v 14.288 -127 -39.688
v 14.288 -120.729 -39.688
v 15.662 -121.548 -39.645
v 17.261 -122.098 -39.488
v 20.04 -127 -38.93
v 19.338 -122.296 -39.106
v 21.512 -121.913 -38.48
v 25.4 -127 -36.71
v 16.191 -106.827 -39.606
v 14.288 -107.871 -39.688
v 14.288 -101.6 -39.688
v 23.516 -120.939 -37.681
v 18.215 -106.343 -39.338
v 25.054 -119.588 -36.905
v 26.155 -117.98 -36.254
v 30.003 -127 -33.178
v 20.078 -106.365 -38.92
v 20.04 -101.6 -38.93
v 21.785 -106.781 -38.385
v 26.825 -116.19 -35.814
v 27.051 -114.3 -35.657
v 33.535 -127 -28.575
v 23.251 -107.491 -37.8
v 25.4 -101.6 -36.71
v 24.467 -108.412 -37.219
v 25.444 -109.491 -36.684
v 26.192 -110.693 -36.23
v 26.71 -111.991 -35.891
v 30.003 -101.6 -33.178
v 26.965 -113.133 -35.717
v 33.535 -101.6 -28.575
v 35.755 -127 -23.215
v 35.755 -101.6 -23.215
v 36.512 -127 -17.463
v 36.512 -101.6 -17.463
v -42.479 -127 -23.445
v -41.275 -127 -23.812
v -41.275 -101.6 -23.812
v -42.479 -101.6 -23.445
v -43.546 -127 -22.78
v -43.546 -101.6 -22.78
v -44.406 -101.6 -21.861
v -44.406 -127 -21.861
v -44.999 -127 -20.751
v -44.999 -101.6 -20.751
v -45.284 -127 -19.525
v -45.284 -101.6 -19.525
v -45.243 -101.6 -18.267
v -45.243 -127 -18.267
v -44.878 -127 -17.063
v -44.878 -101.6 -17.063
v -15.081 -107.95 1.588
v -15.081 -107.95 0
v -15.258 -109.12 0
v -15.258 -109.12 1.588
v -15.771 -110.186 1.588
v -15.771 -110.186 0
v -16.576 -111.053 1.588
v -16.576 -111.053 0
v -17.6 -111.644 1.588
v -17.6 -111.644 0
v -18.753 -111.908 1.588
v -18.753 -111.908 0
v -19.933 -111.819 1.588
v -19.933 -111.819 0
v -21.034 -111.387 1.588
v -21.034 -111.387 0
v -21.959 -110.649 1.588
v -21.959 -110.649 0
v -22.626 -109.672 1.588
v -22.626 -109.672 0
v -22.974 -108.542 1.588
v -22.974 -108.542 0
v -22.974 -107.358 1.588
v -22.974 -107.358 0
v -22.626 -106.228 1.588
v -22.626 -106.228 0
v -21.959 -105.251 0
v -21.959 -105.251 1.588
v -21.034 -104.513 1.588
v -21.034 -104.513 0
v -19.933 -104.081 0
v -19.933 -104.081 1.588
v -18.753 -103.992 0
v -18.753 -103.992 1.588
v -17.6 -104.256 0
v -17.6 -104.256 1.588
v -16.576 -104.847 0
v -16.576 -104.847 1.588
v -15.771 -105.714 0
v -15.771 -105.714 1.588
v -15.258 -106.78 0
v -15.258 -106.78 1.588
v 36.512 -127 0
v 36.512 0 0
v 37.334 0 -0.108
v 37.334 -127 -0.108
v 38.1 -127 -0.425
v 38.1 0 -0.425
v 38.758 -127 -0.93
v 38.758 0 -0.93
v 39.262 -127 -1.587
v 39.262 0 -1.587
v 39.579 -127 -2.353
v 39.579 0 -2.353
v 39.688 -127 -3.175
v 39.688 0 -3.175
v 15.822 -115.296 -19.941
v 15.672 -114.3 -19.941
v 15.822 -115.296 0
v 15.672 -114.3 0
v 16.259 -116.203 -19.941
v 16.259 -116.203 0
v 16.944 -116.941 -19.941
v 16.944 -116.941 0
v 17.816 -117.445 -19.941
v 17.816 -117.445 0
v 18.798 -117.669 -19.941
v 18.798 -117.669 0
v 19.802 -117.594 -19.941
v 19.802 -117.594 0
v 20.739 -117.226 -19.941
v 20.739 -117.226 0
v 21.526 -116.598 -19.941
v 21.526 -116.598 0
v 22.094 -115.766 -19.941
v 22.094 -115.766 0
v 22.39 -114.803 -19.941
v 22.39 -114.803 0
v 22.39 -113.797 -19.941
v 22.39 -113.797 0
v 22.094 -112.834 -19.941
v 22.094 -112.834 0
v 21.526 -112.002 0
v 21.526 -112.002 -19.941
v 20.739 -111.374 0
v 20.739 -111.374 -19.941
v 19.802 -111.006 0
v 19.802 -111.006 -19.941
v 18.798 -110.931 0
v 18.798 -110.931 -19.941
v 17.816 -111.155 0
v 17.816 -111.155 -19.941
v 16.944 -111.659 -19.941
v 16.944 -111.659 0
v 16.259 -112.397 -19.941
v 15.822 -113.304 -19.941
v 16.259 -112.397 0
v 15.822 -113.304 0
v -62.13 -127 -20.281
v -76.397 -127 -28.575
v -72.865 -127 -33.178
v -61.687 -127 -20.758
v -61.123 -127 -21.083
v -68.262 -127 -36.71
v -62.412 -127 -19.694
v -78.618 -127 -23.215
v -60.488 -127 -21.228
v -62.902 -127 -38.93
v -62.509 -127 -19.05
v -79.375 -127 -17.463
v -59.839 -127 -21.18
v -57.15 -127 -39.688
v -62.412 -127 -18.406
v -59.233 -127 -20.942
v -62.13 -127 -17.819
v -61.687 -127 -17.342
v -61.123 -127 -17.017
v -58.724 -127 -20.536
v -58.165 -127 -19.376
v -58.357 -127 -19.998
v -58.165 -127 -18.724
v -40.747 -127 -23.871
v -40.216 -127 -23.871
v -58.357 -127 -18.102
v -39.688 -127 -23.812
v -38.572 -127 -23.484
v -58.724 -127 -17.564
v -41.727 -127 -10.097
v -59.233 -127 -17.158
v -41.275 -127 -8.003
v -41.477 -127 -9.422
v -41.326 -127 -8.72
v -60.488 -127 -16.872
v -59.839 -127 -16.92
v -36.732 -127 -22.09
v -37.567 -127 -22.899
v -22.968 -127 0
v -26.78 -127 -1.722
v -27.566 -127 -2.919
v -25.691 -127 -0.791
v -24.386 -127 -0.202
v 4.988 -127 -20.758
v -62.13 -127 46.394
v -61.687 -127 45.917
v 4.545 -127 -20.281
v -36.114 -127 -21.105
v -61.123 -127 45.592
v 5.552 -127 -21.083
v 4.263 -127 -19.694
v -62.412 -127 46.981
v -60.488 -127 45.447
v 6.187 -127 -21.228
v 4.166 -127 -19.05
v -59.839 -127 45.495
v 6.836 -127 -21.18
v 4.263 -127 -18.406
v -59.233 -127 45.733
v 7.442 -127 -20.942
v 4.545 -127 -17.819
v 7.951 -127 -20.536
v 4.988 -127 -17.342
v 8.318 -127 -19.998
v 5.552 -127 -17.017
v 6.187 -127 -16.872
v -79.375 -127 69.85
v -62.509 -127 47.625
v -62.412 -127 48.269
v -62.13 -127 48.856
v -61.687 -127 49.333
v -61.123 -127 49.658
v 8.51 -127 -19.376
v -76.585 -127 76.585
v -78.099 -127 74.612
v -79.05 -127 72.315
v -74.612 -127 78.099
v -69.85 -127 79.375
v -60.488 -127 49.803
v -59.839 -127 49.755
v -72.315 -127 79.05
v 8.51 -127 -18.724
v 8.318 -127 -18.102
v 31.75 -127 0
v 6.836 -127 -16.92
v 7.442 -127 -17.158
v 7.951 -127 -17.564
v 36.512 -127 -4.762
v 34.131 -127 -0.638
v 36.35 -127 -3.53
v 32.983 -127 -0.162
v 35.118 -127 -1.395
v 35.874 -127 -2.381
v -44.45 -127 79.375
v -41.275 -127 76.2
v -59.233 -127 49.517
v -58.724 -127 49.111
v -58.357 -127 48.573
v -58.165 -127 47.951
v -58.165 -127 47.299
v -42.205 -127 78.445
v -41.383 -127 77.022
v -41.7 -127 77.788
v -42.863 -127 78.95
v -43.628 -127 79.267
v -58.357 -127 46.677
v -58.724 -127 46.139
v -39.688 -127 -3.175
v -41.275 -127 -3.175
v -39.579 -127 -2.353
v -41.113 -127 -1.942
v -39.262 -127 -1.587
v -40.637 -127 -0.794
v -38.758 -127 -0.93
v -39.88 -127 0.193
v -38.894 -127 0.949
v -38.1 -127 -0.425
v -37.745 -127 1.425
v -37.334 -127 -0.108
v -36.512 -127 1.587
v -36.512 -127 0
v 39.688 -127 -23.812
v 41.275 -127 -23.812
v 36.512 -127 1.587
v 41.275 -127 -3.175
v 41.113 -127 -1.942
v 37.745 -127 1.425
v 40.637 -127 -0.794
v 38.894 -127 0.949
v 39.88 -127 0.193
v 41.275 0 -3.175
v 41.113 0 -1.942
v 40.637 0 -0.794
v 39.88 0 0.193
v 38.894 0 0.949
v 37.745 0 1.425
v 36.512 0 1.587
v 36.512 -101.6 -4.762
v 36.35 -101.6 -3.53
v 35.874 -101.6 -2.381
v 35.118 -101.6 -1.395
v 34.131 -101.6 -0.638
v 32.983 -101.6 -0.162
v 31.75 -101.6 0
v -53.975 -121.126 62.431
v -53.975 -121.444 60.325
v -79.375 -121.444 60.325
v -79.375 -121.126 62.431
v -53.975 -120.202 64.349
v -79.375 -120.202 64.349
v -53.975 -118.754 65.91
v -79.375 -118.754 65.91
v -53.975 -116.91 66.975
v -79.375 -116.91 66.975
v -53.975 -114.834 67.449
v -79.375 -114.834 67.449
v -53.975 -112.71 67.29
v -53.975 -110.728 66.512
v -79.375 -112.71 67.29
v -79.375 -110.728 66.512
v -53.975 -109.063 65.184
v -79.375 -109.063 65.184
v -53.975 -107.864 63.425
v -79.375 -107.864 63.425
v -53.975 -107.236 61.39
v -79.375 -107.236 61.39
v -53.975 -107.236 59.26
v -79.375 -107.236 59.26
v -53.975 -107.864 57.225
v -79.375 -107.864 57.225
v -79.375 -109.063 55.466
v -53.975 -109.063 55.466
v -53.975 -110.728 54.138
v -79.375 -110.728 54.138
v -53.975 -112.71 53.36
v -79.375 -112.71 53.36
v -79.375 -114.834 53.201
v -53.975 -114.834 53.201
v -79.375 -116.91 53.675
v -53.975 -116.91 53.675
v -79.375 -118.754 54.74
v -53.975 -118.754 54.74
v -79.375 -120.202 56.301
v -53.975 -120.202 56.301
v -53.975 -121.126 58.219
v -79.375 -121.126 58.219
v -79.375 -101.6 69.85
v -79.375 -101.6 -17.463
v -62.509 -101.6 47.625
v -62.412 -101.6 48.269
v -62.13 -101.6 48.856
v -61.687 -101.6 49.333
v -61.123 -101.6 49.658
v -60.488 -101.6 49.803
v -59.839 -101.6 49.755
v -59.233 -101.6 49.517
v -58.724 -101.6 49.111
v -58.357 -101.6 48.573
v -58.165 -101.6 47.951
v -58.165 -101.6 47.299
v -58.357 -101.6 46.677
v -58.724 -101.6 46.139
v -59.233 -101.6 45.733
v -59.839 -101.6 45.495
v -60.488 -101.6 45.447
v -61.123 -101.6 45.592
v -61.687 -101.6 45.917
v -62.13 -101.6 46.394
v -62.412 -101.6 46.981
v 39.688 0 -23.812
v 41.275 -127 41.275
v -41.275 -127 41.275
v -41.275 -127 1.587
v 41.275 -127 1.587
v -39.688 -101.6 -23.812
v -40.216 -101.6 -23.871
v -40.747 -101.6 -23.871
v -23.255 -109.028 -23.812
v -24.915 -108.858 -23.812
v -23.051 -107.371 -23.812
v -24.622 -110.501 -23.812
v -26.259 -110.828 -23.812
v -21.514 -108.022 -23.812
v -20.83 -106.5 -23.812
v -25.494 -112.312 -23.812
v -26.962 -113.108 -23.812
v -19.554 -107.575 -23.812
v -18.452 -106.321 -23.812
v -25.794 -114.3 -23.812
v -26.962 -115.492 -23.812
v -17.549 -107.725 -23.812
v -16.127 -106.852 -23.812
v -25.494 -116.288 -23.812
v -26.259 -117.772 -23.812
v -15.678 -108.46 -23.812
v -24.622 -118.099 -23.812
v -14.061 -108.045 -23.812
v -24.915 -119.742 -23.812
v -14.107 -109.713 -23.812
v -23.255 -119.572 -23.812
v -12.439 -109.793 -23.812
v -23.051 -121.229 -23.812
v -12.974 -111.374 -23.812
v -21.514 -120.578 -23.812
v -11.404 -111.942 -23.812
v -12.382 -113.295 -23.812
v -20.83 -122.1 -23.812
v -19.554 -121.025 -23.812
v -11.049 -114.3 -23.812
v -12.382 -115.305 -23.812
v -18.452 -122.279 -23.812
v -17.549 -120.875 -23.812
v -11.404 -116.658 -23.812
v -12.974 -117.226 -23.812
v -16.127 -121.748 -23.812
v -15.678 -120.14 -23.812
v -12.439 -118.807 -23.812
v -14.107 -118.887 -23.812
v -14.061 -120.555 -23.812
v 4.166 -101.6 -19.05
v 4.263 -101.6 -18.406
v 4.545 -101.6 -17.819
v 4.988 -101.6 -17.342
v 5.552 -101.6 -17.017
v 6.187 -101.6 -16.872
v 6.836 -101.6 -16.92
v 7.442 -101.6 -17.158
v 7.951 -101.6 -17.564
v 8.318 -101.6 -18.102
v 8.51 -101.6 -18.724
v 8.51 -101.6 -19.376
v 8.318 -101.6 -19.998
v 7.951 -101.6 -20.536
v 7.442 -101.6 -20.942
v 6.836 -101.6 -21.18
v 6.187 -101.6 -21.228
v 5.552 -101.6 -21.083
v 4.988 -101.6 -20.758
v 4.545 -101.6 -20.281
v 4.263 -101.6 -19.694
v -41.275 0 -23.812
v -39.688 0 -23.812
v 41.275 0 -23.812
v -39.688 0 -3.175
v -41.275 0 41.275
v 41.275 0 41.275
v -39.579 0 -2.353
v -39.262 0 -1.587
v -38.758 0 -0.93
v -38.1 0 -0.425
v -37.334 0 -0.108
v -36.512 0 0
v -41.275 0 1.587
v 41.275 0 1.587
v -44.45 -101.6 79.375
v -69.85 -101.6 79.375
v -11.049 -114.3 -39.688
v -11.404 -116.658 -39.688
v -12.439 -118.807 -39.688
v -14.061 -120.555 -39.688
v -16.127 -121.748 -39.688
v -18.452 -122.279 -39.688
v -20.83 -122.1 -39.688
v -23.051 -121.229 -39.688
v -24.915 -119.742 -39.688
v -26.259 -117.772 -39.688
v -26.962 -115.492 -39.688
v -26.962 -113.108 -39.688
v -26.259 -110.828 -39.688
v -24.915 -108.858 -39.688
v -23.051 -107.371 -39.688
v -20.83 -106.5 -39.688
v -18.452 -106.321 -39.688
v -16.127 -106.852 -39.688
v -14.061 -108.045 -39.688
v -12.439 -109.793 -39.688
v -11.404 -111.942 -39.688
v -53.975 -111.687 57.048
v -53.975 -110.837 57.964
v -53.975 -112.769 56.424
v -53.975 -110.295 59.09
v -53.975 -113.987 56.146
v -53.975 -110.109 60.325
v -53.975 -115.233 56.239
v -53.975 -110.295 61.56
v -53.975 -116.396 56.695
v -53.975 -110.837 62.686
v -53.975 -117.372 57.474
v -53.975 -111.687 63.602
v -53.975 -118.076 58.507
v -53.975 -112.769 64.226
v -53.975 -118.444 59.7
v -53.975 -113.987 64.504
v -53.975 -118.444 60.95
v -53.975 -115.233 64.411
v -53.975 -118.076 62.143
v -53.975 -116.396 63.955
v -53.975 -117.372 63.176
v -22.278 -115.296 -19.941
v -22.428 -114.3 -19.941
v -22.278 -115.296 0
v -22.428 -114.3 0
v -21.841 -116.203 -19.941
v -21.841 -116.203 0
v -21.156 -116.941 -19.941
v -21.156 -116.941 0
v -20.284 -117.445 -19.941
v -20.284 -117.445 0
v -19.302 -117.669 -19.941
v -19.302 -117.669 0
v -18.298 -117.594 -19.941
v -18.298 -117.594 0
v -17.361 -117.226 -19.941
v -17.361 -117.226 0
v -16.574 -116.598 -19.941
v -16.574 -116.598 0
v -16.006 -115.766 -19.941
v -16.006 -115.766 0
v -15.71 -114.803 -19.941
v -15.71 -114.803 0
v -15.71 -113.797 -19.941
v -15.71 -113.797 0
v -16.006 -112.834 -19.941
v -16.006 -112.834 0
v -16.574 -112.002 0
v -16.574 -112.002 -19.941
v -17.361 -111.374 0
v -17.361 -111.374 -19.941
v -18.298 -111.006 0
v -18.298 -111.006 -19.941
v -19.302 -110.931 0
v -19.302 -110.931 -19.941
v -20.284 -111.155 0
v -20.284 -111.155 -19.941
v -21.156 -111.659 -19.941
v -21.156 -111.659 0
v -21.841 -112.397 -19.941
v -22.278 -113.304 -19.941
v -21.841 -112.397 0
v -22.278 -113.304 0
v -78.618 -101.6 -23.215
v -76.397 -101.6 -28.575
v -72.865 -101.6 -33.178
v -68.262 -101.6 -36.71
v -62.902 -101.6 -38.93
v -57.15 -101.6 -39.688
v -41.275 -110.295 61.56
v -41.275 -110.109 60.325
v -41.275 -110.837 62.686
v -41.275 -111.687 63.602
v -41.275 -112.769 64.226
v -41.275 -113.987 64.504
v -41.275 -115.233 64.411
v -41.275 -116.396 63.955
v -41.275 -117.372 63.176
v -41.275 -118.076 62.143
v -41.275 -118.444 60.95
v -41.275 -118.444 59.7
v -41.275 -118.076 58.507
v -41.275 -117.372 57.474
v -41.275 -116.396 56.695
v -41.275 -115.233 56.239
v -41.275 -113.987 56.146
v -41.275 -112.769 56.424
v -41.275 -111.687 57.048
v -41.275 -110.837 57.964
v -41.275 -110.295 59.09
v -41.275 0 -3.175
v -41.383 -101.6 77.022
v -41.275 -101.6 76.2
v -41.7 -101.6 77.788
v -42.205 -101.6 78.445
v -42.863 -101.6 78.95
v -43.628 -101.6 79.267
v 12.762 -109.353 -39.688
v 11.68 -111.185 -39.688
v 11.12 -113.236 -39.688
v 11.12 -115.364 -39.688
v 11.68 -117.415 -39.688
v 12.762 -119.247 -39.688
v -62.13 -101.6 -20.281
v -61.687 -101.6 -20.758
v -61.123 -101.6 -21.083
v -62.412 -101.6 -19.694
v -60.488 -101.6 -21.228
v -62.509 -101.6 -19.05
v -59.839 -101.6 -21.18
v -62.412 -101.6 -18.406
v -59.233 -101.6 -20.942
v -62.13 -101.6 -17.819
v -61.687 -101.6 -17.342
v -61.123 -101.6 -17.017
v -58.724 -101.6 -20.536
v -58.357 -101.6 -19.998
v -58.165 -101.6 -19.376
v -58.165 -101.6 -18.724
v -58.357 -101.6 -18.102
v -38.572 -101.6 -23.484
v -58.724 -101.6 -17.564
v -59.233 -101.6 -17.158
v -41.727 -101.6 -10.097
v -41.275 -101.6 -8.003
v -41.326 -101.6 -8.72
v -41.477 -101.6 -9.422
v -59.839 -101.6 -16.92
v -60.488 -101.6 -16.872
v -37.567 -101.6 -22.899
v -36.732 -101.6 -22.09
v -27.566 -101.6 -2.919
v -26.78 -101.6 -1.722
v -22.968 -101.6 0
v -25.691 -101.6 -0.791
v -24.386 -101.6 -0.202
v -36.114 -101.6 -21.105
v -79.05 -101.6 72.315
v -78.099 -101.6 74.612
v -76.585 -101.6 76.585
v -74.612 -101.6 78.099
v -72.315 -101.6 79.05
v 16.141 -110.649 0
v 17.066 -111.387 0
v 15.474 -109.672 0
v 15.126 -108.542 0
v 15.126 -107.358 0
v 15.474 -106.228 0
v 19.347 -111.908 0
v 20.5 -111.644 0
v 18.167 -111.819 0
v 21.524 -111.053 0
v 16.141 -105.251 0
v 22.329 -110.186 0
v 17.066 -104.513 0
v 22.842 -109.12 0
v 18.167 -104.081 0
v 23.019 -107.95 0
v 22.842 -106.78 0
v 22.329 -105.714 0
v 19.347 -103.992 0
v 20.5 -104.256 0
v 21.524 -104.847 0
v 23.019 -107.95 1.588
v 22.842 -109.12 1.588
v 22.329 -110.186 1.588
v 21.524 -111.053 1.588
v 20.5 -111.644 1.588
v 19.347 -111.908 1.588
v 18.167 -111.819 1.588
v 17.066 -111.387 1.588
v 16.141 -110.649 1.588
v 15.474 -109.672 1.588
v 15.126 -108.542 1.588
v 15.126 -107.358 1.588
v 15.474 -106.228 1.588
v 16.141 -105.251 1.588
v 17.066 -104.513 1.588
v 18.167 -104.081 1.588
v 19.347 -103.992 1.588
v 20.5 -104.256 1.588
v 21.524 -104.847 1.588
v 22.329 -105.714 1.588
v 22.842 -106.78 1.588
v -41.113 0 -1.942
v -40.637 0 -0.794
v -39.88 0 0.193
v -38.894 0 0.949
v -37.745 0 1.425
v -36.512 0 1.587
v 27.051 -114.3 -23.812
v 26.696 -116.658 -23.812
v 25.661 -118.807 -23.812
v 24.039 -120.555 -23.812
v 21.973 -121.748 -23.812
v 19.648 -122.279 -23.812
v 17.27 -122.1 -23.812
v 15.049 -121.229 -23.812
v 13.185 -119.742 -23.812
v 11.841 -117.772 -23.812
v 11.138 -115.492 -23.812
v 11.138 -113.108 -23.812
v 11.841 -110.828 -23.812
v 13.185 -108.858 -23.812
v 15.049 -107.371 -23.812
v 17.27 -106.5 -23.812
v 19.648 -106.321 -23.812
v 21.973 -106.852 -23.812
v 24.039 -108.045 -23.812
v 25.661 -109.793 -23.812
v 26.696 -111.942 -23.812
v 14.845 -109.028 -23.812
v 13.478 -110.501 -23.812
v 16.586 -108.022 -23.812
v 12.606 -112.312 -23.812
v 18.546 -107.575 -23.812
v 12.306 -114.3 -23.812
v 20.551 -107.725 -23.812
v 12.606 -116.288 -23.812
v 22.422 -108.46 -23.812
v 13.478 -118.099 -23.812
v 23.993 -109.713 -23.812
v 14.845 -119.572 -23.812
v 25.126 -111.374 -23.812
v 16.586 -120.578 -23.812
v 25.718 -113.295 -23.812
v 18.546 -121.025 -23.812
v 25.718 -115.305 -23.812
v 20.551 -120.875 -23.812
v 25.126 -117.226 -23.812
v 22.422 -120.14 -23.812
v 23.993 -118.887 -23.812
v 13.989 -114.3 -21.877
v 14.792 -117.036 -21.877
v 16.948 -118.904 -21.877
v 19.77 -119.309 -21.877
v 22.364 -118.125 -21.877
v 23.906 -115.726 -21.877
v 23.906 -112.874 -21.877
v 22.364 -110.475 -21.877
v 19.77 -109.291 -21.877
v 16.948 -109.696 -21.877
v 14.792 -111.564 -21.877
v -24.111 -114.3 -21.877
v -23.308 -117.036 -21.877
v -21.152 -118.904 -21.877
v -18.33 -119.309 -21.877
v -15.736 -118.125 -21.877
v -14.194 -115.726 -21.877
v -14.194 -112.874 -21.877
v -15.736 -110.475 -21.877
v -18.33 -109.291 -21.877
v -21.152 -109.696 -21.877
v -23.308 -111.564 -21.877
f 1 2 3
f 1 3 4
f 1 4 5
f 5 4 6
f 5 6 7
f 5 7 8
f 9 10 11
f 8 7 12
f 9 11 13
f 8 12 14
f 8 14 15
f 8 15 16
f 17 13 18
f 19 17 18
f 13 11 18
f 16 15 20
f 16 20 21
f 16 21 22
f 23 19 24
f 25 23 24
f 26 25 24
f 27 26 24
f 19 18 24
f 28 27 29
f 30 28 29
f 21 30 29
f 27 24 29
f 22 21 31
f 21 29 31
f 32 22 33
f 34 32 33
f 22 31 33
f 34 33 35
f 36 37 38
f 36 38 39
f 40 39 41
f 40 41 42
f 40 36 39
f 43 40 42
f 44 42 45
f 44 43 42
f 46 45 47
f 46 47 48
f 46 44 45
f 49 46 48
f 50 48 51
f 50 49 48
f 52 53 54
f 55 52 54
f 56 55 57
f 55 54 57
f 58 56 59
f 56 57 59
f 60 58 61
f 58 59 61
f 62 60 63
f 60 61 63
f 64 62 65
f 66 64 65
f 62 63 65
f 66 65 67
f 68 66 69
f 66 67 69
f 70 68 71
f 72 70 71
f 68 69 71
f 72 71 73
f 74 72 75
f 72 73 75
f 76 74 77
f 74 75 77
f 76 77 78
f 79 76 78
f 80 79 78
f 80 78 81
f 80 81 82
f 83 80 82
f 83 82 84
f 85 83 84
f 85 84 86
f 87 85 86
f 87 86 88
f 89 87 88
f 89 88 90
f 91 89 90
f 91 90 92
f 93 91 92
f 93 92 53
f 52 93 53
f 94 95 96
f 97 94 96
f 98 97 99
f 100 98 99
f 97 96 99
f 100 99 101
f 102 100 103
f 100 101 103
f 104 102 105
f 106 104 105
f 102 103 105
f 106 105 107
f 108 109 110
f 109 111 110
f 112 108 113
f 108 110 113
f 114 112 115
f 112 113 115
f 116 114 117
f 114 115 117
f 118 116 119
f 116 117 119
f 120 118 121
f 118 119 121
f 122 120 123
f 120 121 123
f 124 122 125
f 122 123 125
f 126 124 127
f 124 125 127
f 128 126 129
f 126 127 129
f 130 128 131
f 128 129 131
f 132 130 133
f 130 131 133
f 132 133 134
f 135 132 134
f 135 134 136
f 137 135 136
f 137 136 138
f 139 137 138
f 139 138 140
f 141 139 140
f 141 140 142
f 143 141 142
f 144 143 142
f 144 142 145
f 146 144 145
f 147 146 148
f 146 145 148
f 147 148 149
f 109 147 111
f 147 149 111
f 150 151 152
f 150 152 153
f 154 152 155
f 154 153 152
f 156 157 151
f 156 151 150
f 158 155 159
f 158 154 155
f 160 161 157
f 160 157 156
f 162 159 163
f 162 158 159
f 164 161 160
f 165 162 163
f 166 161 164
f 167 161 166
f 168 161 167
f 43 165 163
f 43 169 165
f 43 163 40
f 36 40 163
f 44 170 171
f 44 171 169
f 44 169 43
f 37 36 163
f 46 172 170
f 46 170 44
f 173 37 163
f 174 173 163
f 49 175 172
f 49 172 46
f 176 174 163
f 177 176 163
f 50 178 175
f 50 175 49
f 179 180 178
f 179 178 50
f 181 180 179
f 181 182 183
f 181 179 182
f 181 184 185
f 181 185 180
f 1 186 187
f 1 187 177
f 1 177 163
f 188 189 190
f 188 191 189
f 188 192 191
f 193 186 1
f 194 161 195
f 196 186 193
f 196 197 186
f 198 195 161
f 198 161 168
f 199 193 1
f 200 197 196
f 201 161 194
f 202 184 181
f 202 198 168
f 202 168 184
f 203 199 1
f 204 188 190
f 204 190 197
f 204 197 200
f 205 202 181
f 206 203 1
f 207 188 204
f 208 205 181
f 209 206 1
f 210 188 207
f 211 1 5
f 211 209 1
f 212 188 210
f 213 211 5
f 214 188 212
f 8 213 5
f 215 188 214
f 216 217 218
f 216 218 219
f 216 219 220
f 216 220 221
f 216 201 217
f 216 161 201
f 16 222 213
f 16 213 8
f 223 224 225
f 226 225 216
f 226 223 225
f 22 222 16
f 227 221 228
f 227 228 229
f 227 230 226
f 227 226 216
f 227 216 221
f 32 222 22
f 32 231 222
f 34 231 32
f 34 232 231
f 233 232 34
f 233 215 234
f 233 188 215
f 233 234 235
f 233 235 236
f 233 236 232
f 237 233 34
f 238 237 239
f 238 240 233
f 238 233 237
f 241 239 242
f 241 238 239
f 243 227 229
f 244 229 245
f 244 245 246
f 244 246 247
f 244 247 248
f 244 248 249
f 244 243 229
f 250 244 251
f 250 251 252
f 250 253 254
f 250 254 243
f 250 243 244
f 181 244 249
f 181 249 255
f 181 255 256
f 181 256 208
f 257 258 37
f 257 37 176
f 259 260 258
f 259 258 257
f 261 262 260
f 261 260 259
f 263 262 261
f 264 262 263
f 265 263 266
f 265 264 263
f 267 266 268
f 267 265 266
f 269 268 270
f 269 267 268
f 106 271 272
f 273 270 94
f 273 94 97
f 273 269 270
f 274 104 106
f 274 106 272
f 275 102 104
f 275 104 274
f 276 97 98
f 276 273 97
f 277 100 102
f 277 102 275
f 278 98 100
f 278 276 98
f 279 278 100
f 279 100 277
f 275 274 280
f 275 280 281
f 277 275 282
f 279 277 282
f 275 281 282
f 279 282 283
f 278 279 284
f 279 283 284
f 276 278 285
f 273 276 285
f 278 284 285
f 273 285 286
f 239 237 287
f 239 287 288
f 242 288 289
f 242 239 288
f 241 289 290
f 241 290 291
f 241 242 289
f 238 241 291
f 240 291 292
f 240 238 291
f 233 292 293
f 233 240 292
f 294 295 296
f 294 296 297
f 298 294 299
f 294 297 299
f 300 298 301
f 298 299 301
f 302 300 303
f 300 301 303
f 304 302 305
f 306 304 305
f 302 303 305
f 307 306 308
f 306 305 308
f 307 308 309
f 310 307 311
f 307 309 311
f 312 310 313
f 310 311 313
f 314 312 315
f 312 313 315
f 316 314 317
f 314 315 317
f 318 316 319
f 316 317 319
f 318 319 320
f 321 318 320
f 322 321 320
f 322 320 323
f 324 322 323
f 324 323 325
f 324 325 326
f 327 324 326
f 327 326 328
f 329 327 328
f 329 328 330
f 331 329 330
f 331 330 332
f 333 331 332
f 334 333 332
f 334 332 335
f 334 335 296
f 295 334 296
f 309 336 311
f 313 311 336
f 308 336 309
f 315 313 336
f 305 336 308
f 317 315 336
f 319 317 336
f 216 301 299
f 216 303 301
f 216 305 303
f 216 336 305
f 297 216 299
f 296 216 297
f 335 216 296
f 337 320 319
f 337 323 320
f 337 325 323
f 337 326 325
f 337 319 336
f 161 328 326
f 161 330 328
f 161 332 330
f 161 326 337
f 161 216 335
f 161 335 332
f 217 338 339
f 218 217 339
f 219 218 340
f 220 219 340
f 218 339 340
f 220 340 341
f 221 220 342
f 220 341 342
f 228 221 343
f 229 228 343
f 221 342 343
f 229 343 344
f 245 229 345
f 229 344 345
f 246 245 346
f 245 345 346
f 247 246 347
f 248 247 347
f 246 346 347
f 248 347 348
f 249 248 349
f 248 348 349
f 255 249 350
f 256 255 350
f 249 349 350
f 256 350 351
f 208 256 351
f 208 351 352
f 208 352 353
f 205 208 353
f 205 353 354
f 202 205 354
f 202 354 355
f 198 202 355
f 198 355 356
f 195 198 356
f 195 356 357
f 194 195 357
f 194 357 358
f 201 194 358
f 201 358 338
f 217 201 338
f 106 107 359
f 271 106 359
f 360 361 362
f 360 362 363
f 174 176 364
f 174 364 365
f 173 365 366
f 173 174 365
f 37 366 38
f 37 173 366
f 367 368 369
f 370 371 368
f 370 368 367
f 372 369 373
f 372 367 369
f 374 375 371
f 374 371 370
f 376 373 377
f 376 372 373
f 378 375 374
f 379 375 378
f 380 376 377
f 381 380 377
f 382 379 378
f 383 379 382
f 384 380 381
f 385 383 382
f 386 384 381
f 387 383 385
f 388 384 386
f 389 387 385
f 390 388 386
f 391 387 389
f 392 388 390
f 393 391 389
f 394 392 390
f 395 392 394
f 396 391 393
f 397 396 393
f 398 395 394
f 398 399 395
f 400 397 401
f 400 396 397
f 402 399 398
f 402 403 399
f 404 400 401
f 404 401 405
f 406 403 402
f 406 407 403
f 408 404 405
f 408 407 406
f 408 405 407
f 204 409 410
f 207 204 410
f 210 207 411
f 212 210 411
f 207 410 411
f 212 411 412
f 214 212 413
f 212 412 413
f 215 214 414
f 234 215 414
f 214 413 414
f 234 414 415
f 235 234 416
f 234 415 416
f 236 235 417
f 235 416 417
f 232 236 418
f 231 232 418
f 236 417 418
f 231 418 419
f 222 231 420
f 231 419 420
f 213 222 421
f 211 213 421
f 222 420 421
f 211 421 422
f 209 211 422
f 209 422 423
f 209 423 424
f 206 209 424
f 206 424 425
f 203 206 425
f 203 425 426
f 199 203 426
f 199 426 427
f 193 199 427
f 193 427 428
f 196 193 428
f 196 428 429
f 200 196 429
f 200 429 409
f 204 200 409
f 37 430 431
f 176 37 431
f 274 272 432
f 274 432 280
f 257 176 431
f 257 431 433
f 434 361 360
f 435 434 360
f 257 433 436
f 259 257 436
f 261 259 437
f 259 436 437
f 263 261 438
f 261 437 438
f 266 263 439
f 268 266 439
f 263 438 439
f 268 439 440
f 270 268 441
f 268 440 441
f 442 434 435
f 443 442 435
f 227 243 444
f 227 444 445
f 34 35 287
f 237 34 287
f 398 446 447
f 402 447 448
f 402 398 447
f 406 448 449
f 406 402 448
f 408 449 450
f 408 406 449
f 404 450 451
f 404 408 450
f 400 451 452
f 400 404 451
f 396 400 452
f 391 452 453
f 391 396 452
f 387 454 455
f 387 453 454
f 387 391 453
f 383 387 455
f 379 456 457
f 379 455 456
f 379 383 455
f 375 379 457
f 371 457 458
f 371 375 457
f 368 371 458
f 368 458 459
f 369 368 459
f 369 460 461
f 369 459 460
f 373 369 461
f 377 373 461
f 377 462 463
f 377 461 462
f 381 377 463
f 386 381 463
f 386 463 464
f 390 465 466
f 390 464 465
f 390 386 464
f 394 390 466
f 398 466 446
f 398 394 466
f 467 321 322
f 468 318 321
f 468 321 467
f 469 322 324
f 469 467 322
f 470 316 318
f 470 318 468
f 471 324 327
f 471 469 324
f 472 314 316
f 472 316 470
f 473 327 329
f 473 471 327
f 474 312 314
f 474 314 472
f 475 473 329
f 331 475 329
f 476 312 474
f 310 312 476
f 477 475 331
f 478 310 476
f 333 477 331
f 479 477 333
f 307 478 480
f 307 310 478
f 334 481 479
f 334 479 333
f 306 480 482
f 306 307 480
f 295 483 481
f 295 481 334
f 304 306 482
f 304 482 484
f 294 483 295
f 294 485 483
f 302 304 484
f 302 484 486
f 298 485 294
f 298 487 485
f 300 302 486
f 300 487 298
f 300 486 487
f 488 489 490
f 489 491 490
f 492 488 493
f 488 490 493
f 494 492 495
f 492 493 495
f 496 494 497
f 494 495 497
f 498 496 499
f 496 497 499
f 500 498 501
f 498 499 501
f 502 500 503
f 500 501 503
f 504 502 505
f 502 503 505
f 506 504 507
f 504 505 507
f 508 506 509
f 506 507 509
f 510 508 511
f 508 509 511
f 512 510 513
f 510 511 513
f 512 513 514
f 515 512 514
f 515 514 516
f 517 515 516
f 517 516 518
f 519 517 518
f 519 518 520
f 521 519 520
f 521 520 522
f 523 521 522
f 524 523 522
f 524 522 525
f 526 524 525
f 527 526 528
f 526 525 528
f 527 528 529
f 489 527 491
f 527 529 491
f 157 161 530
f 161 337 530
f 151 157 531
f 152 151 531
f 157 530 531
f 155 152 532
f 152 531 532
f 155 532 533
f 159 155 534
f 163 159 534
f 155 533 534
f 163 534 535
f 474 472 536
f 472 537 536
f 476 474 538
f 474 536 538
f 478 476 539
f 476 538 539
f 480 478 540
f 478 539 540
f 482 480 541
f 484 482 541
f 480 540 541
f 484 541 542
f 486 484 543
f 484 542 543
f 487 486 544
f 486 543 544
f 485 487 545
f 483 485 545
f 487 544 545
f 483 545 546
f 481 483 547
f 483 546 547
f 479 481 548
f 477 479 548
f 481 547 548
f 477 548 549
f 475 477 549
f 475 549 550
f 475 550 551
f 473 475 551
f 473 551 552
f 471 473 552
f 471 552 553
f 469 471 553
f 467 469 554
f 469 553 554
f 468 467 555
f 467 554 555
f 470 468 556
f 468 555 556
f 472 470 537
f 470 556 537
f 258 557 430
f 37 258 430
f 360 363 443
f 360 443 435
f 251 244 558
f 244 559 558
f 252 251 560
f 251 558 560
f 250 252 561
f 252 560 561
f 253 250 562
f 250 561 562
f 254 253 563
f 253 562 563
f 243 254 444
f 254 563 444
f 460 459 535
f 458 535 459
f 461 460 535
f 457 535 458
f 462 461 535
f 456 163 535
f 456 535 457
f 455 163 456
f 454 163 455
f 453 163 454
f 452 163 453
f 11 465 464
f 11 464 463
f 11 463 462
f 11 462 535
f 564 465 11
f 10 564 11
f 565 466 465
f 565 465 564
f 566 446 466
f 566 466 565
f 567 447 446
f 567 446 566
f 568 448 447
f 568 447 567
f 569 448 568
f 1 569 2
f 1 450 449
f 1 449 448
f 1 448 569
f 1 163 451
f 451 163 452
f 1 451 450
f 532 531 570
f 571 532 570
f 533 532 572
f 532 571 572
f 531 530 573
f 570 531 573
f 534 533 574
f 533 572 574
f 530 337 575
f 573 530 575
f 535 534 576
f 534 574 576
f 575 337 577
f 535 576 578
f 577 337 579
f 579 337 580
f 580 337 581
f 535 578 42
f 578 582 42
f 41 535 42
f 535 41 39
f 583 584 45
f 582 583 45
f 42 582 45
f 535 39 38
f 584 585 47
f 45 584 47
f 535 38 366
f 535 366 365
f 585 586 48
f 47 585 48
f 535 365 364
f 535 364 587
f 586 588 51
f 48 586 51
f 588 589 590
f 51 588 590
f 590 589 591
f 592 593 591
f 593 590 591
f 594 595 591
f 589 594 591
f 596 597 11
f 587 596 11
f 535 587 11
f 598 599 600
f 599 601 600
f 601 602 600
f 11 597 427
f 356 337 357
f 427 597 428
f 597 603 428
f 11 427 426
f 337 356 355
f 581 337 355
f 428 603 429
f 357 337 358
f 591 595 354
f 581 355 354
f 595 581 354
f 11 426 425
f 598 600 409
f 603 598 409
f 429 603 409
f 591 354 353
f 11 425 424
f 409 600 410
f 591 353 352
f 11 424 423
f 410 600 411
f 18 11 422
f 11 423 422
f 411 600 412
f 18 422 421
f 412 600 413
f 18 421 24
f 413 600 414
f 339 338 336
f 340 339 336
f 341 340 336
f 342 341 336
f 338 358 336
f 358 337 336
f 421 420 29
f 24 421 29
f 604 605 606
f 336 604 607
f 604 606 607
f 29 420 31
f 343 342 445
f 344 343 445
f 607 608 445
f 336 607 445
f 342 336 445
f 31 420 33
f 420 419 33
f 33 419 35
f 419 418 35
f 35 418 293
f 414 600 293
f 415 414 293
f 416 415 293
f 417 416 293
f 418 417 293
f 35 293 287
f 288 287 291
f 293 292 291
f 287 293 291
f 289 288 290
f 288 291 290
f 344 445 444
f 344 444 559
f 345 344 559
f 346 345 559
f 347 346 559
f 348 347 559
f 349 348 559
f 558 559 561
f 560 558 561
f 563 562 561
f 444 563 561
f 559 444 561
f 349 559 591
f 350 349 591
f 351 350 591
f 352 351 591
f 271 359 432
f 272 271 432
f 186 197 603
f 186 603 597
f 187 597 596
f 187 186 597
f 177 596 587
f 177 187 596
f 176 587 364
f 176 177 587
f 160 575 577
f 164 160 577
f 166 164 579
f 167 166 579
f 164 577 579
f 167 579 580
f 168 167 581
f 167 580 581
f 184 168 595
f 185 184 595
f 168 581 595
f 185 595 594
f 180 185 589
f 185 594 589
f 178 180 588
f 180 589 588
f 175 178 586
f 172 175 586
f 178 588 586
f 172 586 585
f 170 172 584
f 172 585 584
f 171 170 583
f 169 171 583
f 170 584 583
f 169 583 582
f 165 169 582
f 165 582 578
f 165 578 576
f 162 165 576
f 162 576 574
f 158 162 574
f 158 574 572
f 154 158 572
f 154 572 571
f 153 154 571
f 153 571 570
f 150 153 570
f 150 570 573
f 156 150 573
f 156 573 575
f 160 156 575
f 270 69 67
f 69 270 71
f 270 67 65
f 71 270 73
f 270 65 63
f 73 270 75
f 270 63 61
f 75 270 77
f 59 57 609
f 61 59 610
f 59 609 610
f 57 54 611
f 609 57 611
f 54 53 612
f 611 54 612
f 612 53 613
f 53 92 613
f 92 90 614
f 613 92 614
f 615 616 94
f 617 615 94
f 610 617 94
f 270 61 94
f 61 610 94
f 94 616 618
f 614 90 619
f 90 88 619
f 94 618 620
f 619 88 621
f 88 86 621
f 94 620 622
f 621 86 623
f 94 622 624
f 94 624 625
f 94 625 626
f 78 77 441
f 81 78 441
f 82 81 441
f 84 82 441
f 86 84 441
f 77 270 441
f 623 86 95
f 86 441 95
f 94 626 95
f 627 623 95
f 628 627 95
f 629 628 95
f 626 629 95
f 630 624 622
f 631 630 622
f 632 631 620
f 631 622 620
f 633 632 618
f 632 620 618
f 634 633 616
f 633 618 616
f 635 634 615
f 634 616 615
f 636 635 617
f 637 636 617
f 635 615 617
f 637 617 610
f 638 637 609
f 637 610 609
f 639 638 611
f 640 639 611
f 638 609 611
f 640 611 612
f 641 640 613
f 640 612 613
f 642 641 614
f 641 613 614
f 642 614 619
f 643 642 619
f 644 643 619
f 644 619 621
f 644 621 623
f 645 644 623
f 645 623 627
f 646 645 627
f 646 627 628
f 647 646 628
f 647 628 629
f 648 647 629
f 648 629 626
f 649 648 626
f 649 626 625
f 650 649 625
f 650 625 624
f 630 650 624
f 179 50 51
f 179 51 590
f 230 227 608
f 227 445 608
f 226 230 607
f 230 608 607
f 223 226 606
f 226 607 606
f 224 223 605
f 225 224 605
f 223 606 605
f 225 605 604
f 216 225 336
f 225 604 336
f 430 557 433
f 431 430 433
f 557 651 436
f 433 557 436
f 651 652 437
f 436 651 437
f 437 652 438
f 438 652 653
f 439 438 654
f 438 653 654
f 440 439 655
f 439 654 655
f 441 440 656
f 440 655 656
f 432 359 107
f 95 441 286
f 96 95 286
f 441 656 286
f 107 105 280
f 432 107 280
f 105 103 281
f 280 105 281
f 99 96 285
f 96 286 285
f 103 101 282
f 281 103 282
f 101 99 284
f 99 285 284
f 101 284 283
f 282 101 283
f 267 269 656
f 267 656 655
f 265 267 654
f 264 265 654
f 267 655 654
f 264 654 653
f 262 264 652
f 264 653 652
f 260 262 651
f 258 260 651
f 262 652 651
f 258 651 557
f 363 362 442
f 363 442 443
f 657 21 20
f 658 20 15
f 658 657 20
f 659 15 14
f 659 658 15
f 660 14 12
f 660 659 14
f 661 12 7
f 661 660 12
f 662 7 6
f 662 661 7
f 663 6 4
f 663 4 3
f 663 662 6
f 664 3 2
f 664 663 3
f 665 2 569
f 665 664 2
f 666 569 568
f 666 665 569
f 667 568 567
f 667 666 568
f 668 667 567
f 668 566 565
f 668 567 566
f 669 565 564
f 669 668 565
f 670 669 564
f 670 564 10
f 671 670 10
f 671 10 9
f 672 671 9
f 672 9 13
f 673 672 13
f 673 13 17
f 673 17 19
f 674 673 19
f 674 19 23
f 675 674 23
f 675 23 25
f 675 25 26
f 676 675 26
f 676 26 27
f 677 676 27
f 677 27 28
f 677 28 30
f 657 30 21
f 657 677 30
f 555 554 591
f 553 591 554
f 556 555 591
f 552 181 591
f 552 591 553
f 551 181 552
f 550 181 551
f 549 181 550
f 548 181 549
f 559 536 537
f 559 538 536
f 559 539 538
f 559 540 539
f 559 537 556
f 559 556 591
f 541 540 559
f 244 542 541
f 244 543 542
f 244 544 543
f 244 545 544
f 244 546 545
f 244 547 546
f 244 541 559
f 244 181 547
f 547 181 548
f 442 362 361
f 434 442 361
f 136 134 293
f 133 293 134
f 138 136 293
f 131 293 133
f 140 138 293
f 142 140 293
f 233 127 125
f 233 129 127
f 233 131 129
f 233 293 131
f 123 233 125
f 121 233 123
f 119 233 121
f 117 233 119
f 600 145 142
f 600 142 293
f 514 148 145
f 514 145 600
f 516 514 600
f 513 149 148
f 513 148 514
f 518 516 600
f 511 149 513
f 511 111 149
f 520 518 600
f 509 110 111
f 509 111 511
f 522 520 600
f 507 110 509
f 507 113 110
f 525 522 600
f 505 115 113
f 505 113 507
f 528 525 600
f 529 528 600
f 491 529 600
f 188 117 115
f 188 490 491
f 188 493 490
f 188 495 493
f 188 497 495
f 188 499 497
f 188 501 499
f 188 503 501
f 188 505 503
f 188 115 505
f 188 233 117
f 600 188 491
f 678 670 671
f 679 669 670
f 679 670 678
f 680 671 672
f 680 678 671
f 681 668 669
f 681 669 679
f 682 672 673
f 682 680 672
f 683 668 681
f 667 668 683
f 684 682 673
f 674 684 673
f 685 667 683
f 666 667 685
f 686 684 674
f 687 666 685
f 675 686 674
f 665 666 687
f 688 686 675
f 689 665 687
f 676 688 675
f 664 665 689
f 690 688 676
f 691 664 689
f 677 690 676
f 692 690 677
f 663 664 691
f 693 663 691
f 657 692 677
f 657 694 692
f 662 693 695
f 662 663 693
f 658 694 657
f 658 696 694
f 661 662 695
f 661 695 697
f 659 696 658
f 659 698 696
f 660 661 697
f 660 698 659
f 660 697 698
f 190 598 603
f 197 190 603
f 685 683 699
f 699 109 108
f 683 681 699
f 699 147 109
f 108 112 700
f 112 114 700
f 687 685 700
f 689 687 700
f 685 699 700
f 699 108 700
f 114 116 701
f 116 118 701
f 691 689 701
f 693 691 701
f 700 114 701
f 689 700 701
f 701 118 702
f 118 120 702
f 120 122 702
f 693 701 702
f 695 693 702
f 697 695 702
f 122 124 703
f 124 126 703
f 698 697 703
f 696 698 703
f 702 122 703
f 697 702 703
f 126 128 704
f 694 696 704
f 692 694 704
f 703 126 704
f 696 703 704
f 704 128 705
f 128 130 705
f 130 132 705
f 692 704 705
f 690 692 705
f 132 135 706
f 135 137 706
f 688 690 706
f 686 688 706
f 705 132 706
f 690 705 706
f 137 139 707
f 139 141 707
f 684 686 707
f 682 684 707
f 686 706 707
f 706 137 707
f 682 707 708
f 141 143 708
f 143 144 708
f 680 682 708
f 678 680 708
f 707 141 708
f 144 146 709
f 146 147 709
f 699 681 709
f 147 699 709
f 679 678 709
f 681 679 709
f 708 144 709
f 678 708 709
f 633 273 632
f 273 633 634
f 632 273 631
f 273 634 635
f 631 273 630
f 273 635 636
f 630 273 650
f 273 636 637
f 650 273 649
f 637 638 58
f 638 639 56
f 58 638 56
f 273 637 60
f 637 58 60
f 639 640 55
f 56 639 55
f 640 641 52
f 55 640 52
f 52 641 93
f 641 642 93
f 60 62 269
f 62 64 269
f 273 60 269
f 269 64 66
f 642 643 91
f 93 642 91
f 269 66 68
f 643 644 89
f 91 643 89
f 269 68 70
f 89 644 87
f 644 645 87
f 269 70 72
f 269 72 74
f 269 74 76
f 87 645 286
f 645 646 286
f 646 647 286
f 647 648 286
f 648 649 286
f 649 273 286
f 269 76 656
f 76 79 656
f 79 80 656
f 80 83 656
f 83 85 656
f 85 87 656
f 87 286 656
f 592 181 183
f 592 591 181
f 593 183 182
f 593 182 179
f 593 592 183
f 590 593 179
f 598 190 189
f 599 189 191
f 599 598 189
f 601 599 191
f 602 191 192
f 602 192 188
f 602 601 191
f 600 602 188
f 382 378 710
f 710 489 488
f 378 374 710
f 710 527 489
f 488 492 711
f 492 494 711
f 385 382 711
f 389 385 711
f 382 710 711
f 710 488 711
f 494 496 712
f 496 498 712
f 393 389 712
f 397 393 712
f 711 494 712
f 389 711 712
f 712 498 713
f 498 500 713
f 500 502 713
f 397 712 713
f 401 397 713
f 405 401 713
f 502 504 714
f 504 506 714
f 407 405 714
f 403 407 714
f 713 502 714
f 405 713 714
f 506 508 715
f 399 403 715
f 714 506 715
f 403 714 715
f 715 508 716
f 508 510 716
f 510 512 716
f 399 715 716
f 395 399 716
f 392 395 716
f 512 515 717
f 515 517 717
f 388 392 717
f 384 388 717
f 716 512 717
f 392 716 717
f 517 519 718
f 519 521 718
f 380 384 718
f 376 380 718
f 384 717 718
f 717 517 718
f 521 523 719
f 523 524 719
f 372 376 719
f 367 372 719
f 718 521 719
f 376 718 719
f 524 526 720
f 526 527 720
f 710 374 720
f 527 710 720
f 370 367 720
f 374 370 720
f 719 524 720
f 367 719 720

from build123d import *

# Parameters (mm, degrees)
F1_DEPTH        = 127
F2_W            = 82.55
F2_H            = 39.6875
F3_DEPTH        = 127
F4_R            = 3.96875
F5_DEPTH        = 25.4
F7_DEPTH        = 25.4
F8_R            = 22.225
F10_R           = 8.001
F11_DEPTH       = 25.4
F12_D           = 6.7564
F12_CSINK_D     = 13.4874
F12_CSINK_ANGLE = 82
F13_R           = 3.175
F14_R           = 9.525
F16_D           = 8.382
F16_CBORE_D     = 14.2875
F16_CBORE_DEPTH = 25.4
F17_R           = 5.08
F18_R           = 2.1844
F19_DEPTH       = 25.4010001


with BuildPart() as f1:
    # F0 (on Front) → F1 (new body)
    with BuildSketch(Plane.XZ):
        with BuildLine():
            Line((39.6875, -23.8125), (41.275, -23.8125))
            Line((41.275, -23.8125), (41.275, -3.175))
            ThreePointArc((41.275, -3.175), (39.8800960454, 0.1925960454), (36.5125, 1.5875))
            Line((36.5125, 1.5875), (-36.5125, 1.5875))
            ThreePointArc((-36.5125, 1.5875), (-39.8800960454, 0.1925960454), (-41.275, -3.175))
            Line((-41.275, -3.175), (-41.275, -23.8125))
            Line((-41.275, -23.8125), (-39.6875, -23.8125))
            Line((-39.6875, -23.8125), (-39.6875, -3.175))
            ThreePointArc((-39.6875, -3.175), (-38.7575640303, -0.9299359697), (-36.5125, 0))
            Line((-36.5125, 0), (36.5125, 0))
            ThreePointArc((36.5125, 0), (38.7575640303, -0.9299359697), (39.6875, -3.175))
            Line((39.6875, -3.175), (39.6875, -23.8125))
        make_face()
    extrude(amount=F1_DEPTH)

    # F4 (on face) → F5 (cut)
    with BuildSketch(Plane(origin=(0, 0, 0), x_dir=(1, 0, 0), z_dir=(0, 0, -1))):
        with Locations((-19.05, 107.95)):
            Circle(F4_R)
        with Locations((19.05, 107.95)):
            Circle(F4_R)
    extrude(amount=-F5_DEPTH, mode=Mode.SUBTRACT)


with BuildPart() as f3:
    # F2 (on face) → F3 (new body, through all)
    with BuildSketch(Plane.XZ.offset(127)):
        with Locations((0, 21.43125)):
            Rectangle(F2_W, F2_H)
    extrude(amount=-F3_DEPTH)


with BuildPart() as f7:
    # F6 (on face) → F7 (new body)
    with BuildSketch(Plane.XZ.offset(127)):
        with BuildLine():
            Line((-41.275, -3.175), (-41.275, 79.375))
            Line((-41.275, 79.375), (-79.375, 79.375))
            Line((-79.375, 79.375), (-79.375, -39.6875))
            Line((-79.375, -39.6875), (36.5125, -39.6875))
            Line((36.5125, -39.6875), (36.5125, -4.7625))
            ThreePointArc((36.5125, -4.7625), (35.1175960454, -1.3949039546), (31.75, 0))
            Line((31.75, 0), (-26.19375, 0))
            Line((-26.19375, 0), (-36.1136453021, -21.1051003173))
            ThreePointArc((-36.1136453021, -21.1051003173), (-37.5670779324, -22.8990239183), (-39.6875, -23.8125))
            ThreePointArc((-39.6875, -23.8125), (-40.48125, -23.8782230188), (-41.275, -23.8125))
            ThreePointArc((-41.275, -23.8125), (-44.7385710396, -21.3249952393), (-44.8782165057, -17.063011731))
            Line((-44.8782165057, -17.063011731), (-41.275, -9.0984368335))
            Line((-41.275, -9.0984368335), (-41.275, -3.175))
        make_face()
    extrude(amount=-F7_DEPTH)

    # F8
    f8_edges = [f7.edges().sort_by_distance(p)[0] for p in [
        (-79.375, -114.3, -39.6875),
        (36.5125, -114.3, -39.6875),
    ]]
    fillet(f8_edges, radius=F8_R)

    # F10 (on offset) → F11 (cut)
    with BuildSketch(Plane(origin=(0, 0, -23.8125), x_dir=(1, 0, 0), z_dir=(0, 0, -1))):
        with Locations((-19.05, 114.3)):
            Circle(F10_R)
        with Locations((19.05, 114.3)):
            Circle(F10_R)
    extrude(amount=F11_DEPTH, mode=Mode.SUBTRACT)

    # F12 (through all)
    with Locations(Plane(origin=(0, 0, -23.8125), x_dir=(1, 0, 0), z_dir=(0, 0, -1))):
        with Locations((-19.05, 114.3), (19.05, 114.3)):
            CounterSinkHole(F12_D / 2, F12_CSINK_D / 2, counter_sink_angle=F12_CSINK_ANGLE)

    # F13
    f13_edges = [f7.edges().sort_by_distance(p)[0] for p in [
        (-41.275, -114.3, 79.375),
    ]]
    fillet(f13_edges, radius=F13_R)

    # F14
    f14_edges = [f7.edges().sort_by_distance(p)[0] for p in [
        (-79.375, -114.3, 79.375),
    ]]
    fillet(f14_edges, radius=F14_R)

    # F16 (through all)
    with Locations(Plane(origin=(-79.375, 0, 0), x_dir=(0, -1, 0), z_dir=(-1, 0, 0))):
        with Locations((114.3, 60.325)):
            CounterBoreHole(F16_D / 2, F16_CBORE_D / 2, F16_CBORE_DEPTH)

    # F17
    f17_edges = [f7.edges().sort_by_distance(p)[0] for p in [
        (-41.275, -114.3, -9.098437),
        (-26.19375, -114.3, 0),
    ]]
    fillet(f17_edges, radius=F17_R)

    # F18 (on face) → F19 (cut, through all)
    with BuildSketch(Plane(origin=(0, -101.6, 0), x_dir=(-1, 0, 0), z_dir=(0, 1, 0))):
        with Locations((60.325, 47.625)):
            Circle(F18_R)
        with Locations((60.325, -19.05)):
            Circle(F18_R)
        with Locations((-6.35, -19.05)):
            Circle(F18_R)
    extrude(amount=-F19_DEPTH, mode=Mode.SUBTRACT)


solid = Compound([f1.part, f3.part, f7.part])
